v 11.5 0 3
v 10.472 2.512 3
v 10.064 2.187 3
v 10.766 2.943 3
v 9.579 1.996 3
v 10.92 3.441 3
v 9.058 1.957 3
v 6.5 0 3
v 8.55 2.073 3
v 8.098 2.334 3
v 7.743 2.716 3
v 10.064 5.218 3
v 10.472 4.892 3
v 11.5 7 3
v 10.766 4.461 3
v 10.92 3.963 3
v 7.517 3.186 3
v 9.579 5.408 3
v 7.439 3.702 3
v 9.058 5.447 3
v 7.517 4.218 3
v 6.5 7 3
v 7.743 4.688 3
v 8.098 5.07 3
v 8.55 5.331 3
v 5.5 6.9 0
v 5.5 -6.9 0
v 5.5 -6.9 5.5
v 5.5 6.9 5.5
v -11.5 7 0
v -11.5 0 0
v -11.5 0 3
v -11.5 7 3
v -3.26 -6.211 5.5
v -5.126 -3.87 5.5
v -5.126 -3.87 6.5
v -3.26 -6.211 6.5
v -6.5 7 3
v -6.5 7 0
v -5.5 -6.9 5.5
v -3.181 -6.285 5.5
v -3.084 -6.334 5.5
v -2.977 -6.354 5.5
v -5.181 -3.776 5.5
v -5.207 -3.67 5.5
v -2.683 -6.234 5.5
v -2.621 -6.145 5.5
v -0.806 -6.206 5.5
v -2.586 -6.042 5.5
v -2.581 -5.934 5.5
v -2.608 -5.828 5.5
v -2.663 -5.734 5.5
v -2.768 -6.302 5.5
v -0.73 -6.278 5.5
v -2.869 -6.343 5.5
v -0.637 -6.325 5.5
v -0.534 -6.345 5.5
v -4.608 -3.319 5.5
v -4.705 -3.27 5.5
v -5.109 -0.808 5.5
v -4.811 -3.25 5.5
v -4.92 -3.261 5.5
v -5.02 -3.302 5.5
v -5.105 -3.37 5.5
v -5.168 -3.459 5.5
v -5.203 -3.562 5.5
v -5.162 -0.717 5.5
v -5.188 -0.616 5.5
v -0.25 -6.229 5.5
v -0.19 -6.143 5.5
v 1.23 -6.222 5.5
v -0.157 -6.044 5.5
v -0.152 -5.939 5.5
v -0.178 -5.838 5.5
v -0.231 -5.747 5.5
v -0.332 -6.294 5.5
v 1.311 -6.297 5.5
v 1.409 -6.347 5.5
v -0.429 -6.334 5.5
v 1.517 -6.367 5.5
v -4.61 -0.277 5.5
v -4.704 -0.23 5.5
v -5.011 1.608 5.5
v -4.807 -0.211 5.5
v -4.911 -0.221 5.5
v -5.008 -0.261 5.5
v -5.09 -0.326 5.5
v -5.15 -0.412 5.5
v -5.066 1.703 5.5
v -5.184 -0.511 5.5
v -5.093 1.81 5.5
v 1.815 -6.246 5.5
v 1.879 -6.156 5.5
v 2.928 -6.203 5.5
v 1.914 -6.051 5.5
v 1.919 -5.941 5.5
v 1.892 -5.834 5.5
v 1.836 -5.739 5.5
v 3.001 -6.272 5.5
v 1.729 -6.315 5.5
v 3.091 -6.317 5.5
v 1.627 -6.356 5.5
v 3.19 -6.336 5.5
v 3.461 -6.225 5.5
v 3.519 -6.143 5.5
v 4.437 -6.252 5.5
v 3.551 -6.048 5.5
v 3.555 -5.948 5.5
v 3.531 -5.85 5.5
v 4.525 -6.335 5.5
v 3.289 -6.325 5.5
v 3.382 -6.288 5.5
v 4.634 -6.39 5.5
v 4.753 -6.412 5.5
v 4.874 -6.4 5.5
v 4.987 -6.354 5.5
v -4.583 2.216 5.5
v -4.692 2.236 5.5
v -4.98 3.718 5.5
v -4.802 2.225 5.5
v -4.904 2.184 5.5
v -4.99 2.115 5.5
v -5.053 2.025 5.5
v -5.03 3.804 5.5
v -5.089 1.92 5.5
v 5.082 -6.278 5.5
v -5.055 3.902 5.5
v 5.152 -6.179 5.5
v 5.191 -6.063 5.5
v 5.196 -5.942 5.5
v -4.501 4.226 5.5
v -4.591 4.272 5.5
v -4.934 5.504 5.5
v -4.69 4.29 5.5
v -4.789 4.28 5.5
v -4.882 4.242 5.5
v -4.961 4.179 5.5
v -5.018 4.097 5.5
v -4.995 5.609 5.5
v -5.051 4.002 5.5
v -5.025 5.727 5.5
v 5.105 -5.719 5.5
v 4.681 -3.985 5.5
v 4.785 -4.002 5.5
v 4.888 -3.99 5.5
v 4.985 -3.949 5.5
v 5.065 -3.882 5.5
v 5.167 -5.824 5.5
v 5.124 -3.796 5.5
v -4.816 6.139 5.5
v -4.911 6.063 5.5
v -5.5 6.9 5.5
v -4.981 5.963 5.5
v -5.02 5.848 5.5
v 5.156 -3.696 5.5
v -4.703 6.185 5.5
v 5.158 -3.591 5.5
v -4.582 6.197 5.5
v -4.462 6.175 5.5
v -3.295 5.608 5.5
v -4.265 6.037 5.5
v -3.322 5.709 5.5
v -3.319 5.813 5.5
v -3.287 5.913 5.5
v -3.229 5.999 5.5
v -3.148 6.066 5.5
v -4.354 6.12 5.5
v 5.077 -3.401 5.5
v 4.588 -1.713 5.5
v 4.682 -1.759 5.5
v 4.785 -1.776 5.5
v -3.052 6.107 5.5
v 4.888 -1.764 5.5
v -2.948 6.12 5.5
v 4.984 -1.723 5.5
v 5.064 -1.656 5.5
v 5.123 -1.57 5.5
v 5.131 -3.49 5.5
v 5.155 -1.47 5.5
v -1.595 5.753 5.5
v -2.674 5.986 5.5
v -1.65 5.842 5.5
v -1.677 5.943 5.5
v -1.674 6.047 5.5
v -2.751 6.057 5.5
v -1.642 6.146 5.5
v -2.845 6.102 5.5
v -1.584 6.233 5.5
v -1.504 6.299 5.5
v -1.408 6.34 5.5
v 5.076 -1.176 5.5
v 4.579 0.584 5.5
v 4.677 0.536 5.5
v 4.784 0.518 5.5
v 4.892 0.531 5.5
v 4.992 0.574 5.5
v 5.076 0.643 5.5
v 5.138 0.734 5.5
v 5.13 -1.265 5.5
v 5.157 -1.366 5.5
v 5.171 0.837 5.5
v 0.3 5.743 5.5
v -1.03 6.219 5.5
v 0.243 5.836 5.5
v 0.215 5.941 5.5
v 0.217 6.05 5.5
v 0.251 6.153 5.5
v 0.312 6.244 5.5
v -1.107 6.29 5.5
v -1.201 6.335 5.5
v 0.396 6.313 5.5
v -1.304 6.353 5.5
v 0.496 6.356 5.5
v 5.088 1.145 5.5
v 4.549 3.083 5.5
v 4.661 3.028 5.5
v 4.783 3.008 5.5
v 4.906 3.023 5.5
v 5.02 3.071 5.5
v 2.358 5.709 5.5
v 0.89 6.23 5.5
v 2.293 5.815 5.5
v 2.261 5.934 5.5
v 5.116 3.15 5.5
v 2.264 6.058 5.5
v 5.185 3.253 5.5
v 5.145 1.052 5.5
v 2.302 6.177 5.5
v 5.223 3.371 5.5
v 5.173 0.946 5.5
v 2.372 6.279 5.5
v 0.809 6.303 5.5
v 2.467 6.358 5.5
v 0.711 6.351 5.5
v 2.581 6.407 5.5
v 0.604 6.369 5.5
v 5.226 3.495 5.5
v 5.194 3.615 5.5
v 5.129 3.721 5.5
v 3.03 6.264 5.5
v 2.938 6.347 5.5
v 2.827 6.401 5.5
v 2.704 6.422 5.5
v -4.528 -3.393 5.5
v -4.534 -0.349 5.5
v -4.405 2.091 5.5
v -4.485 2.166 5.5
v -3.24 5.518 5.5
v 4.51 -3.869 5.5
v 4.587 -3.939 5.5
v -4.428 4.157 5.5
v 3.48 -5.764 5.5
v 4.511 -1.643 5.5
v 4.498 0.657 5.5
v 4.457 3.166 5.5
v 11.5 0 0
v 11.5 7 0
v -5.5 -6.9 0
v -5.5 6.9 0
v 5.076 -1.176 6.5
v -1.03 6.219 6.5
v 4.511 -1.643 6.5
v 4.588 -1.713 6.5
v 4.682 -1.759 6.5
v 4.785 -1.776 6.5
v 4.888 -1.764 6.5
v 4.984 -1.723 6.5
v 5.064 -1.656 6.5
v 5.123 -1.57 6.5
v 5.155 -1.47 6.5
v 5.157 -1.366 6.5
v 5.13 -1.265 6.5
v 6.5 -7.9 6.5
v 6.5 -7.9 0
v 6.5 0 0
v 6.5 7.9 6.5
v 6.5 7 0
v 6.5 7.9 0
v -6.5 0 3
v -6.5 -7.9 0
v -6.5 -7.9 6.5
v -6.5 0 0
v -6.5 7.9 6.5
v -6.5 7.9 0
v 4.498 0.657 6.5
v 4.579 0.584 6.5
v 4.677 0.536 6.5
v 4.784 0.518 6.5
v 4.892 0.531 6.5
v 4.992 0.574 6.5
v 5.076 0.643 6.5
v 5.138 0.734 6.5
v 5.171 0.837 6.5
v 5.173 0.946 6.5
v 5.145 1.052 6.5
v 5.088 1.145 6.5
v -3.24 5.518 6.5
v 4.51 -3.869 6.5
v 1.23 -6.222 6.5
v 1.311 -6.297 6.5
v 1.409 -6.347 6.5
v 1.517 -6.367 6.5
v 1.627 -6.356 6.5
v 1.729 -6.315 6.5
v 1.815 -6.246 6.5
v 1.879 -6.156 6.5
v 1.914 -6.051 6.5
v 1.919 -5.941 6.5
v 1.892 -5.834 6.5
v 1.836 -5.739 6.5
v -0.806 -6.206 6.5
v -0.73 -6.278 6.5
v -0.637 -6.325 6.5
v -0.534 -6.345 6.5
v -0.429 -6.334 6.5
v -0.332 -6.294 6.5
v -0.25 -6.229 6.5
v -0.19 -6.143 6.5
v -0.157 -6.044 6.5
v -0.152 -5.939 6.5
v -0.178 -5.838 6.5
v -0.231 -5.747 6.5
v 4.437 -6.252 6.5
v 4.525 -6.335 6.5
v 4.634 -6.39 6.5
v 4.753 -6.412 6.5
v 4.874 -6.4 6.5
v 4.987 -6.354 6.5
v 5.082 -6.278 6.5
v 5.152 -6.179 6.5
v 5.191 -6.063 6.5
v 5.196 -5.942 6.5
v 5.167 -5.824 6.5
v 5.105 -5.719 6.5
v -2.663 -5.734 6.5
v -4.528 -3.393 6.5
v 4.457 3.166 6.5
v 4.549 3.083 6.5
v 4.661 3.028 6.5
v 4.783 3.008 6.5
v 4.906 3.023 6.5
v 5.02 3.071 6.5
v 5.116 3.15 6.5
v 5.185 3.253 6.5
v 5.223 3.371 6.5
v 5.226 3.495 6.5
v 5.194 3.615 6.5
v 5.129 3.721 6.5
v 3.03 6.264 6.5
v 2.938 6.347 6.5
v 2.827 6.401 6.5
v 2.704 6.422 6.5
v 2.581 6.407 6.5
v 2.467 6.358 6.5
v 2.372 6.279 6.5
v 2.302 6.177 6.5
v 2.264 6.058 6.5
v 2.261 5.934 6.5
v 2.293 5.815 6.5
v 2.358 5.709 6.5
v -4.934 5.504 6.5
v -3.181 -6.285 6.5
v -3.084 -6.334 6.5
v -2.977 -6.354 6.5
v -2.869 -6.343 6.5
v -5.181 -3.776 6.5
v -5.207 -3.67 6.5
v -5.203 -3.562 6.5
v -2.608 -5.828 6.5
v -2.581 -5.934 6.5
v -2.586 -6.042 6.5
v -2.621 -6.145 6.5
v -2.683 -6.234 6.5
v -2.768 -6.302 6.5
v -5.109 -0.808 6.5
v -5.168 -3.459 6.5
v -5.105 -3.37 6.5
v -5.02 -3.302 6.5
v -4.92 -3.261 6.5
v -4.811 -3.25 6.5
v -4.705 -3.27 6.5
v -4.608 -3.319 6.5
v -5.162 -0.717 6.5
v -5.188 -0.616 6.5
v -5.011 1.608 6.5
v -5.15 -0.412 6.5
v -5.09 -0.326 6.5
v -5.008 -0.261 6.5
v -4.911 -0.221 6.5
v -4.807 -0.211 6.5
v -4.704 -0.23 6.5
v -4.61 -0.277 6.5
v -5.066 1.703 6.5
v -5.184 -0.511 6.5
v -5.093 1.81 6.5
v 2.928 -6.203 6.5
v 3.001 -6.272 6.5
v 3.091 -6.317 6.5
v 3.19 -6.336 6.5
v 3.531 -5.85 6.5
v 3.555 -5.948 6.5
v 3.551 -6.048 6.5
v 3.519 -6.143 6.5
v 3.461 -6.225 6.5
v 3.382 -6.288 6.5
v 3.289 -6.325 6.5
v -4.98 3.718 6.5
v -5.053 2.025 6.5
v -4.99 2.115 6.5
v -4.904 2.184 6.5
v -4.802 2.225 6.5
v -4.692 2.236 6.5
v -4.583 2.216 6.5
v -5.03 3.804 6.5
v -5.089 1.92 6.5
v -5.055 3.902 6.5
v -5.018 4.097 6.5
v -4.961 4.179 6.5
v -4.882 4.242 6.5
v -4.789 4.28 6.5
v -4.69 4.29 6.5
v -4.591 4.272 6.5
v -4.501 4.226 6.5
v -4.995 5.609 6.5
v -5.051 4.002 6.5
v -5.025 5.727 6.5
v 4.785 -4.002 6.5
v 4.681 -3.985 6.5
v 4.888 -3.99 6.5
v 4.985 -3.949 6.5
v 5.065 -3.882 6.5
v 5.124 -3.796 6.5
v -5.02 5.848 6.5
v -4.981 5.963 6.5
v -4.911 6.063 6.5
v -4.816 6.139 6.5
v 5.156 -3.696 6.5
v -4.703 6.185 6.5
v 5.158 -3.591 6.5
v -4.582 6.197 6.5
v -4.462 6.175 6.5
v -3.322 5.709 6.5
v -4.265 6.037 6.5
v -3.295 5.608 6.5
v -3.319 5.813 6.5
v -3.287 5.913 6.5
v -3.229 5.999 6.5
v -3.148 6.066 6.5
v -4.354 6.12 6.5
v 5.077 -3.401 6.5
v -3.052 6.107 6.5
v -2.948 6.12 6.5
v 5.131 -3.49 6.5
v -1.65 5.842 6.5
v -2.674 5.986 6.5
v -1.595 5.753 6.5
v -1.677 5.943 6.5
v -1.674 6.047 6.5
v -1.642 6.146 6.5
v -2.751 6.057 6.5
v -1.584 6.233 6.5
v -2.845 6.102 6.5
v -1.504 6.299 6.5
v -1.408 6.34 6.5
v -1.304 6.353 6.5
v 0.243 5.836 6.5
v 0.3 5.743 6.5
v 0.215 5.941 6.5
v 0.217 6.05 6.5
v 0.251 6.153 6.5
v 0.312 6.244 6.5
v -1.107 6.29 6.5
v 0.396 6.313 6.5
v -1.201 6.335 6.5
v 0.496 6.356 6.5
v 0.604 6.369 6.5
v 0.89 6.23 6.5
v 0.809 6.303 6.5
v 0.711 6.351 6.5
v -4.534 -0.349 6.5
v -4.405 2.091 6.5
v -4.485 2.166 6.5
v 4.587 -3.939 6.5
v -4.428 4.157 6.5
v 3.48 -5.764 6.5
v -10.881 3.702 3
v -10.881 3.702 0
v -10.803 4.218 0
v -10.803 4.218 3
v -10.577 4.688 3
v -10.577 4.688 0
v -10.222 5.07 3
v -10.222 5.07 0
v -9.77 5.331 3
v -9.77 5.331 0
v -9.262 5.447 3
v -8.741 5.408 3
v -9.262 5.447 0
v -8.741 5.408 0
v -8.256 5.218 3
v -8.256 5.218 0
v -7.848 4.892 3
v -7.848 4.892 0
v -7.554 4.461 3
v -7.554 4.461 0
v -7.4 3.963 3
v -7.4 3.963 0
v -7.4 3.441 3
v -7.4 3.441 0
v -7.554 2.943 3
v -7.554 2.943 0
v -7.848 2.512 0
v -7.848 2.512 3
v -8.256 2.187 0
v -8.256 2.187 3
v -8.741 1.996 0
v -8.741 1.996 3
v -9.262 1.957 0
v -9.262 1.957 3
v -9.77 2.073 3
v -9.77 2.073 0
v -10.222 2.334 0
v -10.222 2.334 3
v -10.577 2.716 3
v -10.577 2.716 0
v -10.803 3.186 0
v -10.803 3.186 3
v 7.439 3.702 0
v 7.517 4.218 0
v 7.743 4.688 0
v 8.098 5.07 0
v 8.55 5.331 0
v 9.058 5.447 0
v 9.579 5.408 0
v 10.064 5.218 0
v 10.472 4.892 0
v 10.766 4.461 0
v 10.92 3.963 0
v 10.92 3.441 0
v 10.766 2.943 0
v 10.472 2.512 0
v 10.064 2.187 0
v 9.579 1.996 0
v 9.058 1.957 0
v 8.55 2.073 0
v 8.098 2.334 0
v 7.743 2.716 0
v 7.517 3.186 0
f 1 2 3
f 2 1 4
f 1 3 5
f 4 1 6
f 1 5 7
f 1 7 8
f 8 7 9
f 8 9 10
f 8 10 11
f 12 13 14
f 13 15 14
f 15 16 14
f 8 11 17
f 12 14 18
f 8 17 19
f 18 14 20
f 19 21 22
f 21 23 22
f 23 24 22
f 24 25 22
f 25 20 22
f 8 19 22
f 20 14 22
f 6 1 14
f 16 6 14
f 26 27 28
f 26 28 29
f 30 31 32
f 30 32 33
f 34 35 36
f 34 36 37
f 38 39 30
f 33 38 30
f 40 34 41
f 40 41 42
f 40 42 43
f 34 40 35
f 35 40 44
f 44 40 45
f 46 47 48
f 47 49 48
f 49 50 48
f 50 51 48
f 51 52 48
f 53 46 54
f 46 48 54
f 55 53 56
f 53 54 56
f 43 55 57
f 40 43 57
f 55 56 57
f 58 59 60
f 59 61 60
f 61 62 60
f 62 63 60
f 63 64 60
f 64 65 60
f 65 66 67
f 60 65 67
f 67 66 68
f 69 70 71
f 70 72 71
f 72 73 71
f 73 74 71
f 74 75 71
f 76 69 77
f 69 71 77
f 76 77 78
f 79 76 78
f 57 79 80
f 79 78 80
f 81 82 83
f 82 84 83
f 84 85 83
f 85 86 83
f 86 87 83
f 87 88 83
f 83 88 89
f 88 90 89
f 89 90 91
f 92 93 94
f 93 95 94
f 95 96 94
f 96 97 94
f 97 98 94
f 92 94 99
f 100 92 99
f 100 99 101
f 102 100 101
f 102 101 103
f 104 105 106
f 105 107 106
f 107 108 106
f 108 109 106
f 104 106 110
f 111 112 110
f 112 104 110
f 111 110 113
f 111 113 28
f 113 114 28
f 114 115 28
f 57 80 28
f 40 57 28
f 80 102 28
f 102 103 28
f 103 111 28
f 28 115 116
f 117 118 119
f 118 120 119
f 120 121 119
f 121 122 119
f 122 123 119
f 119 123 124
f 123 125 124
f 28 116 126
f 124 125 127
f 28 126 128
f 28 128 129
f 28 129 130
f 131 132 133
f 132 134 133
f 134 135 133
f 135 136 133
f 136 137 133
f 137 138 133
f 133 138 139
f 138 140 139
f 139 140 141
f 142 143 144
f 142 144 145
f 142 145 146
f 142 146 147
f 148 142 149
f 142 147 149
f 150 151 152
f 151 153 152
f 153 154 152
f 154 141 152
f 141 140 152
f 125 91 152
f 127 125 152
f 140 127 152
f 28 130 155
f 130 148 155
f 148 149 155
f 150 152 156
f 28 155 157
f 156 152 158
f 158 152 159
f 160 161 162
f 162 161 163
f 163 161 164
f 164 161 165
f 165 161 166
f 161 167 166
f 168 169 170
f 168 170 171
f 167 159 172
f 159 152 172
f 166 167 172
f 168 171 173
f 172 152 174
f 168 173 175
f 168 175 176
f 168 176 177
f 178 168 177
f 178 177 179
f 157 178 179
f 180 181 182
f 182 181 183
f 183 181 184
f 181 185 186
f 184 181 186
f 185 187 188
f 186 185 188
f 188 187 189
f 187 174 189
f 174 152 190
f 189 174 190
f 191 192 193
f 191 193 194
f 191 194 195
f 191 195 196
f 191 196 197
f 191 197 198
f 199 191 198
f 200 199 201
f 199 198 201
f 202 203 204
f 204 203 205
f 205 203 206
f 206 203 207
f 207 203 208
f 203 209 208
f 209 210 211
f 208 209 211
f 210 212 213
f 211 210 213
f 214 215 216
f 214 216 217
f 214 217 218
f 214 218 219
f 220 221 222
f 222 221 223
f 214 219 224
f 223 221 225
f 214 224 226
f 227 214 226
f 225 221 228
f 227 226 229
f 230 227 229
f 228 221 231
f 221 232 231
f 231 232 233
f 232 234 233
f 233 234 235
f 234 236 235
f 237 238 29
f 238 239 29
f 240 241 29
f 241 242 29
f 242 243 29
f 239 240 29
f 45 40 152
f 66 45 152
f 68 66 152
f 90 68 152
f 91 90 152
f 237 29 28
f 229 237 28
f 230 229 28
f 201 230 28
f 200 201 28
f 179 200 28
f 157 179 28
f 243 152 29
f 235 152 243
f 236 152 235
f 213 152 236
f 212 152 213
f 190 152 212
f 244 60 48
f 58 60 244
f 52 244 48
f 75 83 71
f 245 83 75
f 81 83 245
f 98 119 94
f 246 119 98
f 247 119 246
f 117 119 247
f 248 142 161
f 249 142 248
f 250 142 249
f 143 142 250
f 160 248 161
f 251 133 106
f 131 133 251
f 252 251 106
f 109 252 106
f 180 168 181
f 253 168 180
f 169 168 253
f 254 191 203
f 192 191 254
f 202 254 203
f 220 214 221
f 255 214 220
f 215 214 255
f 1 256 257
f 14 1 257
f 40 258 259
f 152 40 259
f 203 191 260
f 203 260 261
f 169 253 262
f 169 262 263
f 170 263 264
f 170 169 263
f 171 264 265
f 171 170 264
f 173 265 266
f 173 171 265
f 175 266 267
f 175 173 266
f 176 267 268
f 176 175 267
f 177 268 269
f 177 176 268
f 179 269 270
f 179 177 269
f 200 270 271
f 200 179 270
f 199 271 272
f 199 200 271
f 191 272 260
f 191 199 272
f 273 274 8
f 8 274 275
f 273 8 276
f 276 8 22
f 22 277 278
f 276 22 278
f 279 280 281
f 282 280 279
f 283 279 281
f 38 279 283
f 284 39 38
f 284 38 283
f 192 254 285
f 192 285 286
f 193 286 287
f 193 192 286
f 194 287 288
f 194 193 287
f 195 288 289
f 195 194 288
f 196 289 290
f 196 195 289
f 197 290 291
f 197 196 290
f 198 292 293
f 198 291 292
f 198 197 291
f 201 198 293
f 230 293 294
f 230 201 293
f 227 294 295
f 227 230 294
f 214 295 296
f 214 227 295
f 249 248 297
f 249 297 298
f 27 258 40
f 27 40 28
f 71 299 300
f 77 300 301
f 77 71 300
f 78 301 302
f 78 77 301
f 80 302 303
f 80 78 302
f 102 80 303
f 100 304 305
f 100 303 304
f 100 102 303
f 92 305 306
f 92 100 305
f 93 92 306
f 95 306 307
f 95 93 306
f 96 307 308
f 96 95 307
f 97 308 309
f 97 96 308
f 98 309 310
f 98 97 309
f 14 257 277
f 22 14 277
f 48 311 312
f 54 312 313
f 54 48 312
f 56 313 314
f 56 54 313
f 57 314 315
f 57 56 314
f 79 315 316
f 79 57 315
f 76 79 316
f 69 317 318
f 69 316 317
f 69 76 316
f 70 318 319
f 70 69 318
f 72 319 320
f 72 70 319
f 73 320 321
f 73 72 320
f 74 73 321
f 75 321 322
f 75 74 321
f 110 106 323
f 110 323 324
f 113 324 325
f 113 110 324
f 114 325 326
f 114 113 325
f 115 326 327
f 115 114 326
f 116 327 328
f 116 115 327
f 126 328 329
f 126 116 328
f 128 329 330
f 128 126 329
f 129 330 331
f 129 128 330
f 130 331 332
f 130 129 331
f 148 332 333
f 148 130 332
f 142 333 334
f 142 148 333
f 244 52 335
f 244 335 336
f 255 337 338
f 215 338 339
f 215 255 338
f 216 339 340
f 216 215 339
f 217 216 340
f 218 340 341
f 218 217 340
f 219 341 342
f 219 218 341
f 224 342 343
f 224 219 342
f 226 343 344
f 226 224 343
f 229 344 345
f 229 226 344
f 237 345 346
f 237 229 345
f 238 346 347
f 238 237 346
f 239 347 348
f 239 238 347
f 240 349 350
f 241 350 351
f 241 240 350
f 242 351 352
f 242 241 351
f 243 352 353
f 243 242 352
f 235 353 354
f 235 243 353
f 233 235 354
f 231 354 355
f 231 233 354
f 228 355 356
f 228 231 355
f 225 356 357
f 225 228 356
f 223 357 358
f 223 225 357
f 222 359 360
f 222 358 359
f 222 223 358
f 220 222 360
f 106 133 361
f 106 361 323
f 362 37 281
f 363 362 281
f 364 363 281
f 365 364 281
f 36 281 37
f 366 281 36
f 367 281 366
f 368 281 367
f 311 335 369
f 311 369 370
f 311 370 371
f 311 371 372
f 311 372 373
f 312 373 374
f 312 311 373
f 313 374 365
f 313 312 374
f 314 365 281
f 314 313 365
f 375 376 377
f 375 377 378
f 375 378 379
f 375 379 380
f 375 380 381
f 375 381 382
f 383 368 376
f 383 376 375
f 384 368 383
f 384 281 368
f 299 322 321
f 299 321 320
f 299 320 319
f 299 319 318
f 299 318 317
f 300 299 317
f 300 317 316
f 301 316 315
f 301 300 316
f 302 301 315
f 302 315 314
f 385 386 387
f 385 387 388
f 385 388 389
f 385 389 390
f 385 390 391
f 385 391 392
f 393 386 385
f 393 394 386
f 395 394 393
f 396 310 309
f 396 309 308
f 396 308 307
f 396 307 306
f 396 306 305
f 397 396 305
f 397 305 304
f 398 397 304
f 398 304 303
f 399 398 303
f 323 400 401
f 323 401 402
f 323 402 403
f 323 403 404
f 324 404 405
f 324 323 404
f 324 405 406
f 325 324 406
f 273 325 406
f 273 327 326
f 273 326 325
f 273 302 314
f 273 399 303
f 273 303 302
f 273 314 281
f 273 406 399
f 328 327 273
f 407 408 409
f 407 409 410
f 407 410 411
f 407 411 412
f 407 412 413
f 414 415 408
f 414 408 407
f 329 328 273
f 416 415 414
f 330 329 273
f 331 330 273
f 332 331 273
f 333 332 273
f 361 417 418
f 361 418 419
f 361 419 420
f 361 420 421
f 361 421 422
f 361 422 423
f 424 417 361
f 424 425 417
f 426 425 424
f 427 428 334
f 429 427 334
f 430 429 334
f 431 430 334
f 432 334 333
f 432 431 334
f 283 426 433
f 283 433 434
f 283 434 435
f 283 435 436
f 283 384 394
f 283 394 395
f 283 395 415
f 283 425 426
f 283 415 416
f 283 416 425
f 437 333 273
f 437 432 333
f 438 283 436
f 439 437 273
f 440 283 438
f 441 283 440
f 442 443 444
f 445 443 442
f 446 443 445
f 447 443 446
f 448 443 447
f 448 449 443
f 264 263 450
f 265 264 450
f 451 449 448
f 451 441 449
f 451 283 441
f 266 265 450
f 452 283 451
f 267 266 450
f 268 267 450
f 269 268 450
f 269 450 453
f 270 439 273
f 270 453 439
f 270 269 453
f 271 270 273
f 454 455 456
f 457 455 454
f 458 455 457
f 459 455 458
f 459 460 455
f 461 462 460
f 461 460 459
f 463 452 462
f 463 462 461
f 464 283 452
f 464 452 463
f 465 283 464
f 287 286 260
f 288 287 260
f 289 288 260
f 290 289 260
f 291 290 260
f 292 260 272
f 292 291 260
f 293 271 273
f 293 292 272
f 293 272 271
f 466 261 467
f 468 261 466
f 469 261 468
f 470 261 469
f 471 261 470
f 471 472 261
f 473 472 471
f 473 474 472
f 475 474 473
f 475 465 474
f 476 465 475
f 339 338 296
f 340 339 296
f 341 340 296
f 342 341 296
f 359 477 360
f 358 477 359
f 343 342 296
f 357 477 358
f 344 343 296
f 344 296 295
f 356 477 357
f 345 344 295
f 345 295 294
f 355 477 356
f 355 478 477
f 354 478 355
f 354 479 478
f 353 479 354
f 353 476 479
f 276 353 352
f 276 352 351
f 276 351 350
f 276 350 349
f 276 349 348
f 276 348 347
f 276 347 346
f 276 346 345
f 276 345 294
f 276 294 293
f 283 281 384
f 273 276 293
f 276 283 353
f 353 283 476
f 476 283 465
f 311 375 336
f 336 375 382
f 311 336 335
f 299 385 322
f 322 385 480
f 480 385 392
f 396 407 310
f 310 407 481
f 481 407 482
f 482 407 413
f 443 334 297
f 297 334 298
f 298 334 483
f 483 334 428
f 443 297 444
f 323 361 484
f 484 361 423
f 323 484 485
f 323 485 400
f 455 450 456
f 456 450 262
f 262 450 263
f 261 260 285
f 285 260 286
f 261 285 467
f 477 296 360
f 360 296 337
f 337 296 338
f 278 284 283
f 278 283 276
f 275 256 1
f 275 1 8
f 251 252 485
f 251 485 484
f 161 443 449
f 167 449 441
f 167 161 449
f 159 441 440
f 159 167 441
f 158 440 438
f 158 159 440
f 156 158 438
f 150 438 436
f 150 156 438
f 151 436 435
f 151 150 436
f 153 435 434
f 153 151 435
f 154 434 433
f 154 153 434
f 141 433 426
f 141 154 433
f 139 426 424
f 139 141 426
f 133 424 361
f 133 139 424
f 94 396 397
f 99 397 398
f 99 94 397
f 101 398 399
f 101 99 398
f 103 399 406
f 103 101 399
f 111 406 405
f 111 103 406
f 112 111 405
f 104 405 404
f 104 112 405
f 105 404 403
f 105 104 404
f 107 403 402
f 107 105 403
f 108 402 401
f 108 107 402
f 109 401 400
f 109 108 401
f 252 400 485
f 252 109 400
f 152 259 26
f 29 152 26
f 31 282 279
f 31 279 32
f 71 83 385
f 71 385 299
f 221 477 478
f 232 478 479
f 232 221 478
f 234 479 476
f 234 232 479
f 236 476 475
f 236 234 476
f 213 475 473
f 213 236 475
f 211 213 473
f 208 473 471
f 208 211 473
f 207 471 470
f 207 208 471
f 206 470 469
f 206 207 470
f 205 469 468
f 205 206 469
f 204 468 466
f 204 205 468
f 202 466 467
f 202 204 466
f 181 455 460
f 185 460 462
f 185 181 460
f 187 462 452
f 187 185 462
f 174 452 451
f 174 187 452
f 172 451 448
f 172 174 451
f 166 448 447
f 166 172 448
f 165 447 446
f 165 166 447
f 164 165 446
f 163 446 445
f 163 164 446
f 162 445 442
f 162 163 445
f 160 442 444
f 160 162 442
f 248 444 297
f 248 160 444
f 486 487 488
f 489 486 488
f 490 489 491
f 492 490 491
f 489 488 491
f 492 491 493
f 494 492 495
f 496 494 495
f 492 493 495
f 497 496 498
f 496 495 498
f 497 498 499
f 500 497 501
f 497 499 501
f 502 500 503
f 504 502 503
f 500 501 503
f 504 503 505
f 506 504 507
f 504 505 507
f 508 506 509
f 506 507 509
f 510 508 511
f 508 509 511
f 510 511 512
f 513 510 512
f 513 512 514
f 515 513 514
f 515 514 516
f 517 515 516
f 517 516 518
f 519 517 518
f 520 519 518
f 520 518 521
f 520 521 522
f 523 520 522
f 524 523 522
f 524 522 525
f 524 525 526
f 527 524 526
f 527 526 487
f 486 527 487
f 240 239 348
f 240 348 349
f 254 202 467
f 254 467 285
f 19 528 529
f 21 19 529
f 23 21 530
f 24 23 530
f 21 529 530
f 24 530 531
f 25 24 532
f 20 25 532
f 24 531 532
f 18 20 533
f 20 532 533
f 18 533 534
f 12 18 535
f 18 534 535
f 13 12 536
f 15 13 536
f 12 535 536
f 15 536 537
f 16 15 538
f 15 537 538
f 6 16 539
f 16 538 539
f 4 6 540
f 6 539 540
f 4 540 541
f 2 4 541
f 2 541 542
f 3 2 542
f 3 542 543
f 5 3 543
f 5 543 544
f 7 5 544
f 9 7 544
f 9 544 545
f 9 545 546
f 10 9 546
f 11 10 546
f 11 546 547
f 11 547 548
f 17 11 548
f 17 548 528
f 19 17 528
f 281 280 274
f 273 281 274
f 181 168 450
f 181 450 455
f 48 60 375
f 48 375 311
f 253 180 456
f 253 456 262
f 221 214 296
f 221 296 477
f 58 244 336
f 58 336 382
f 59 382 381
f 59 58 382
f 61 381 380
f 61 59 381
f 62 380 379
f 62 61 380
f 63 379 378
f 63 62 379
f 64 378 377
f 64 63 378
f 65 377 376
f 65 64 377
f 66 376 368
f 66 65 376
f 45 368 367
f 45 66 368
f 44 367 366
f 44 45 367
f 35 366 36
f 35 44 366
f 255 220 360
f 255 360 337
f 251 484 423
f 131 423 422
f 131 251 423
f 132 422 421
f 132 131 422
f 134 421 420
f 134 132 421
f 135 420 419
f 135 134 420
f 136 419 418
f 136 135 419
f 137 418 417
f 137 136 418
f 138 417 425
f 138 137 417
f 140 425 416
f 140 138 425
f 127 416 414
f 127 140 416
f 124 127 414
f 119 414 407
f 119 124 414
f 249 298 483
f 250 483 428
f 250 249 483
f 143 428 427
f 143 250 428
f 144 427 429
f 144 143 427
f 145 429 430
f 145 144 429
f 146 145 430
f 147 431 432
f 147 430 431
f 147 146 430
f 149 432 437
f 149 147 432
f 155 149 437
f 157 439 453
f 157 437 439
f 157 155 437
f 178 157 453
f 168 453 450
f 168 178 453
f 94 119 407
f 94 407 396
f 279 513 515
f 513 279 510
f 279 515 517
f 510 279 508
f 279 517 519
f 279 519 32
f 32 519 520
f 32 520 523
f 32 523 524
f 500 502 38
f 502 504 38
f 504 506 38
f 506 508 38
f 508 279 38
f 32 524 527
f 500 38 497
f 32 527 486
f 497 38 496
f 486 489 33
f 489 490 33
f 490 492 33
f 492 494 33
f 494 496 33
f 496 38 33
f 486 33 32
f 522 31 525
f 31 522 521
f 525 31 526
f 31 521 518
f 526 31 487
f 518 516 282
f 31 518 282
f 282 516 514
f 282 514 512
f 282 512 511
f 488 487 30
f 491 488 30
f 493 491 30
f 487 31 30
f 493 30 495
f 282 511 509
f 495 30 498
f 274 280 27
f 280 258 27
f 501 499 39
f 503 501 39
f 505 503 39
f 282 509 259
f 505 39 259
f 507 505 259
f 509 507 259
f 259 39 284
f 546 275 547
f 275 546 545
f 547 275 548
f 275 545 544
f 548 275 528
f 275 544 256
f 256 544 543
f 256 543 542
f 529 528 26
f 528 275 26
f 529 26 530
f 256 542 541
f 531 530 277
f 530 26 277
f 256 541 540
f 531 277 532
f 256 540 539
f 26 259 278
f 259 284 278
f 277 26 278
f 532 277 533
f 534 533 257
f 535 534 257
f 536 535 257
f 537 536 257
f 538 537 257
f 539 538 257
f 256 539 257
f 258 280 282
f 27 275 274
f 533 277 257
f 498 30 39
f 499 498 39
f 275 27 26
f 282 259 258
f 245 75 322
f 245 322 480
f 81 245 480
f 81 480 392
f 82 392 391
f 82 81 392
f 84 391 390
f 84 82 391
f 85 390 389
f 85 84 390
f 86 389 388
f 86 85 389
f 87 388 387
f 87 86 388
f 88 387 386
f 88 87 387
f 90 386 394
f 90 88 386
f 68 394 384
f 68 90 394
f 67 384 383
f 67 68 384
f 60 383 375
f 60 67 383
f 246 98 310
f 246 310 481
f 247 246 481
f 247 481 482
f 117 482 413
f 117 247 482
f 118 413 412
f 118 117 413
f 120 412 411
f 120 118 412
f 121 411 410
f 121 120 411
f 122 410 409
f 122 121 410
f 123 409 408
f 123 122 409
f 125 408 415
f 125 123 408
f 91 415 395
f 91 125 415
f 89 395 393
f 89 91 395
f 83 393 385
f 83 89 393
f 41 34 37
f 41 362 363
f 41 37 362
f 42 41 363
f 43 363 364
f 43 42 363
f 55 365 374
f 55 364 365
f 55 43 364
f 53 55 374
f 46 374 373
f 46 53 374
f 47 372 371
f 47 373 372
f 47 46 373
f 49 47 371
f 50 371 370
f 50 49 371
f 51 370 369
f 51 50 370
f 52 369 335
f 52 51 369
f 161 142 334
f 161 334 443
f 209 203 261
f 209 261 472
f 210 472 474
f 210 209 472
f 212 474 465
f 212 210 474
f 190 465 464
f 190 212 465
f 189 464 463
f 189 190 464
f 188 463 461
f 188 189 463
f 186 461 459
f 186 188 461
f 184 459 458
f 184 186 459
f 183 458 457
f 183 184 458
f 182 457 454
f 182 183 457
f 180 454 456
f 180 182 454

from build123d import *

# Parameters (mm, degrees)
SKETCH1_W           = 13
SKETCH1_H           = 15.8
BOSS_EXTRUDE1_DEPTH = 6.5
SHELL1_T            = -1
CUT_EXTRUDE2_DEPTH  = 2.5
SKETCH3_W           = 5
SKETCH3_H           = 7
BOSS_EXTRUDE2_DEPTH = 3
SKETCH4_R           = 1.75
CUT_EXTRUDE3_DEPTH  = 5


with BuildPart() as part:
    # Sketch1 → Boss-Extrude1 (new body)
    with BuildSketch(Plane.XY):
        Rectangle(SKETCH1_W, SKETCH1_H)
    extrude(amount=BOSS_EXTRUDE1_DEPTH)

    # Shell1
    shell1_openings = [part.faces().sort_by_distance(p)[0] for p in [
        (0, 0, 0),
    ]]
    offset(amount=SHELL1_T, openings=shell1_openings, kind=Kind.INTERSECTION)

    # Sketch2 → Cut-Extrude2 (cut)
    with BuildSketch(Plane(origin=(0, 0, 5.5), x_dir=(-1, 0, 0), z_dir=(0, 0, -1))):
        with BuildLine():
            Line((-5.105072533, -5.71873747), (4.265069263, 6.036531329))
            ThreePointArc((4.265069263, 6.036531329), (4.865789922, 6.104354629), (4.933613222, 5.50363397))
            Line((4.933613222, 5.50363397), (-4.436528574, -6.251634828))
            ThreePointArc((-4.436528574, -6.251634828), (-5.037249233, -6.319458129), (-5.105072533, -5.71873747))
        make_face()
        with BuildLine():
            Line((-3.479803699, -5.763578957), (4.428264236, 4.157451726))
            ThreePointArc((4.428264236, 4.157451726), (4.923771659, 4.213396112), (4.979716045, 3.71788869))
            Line((4.979716045, 3.71788869), (-2.92835189, -6.203141993))
            ThreePointArc((-2.92835189, -6.203141993), (-3.423859312, -6.259086379), (-3.479803699, -5.763578957))
        make_face()
        with BuildLine():
            Line((-1.836206221, -5.738869047), (4.404824726, 2.090787959))
            ThreePointArc((4.404824726, 2.090787959), (4.949248544, 2.152255164), (5.01071575, 1.607831346))
            Line((5.01071575, 1.607831346), (-1.230315197, -6.22182566))
            ThreePointArc((-1.230315197, -6.22182566), (-1.774739016, -6.283292866), (-1.836206221, -5.738869047))
        make_face()
        with BuildLine():
            Line((0.230638955, -5.747393414), (4.533785605, -0.348900345))
            ThreePointArc((4.533785605, -0.348900345), (5.051093924, -0.290494567), (5.109499701, -0.807802886))
            Line((5.109499701, -0.807802886), (0.806353052, -6.206295955))
            ThreePointArc((0.806353052, -6.206295955), (0.289044733, -6.264701733), (0.230638955, -5.747393414))
        make_face()
        with BuildLine():
            Line((2.662525183, -5.734264805), (4.528368603, -3.393479423))
            ThreePointArc((4.528368603, -3.393479423), (5.065343895, -3.33285318), (5.125970138, -3.869828472))
            Line((5.125970138, -3.869828472), (3.260126717, -6.210613854))
            ThreePointArc((3.260126717, -6.210613854), (2.723151425, -6.271240097), (2.662525183, -5.734264805))
        make_face()
        with BuildLine():
            Line((-5.076600471, -3.401160753), (2.673836157, 5.986195062))
            ThreePointArc((2.673836157, 5.986195062), (3.1909607, 6.035588301), (3.24035394, 5.518463758))
            Line((3.24035394, 5.518463758), (-4.510082688, -3.868892057))
            ThreePointArc((-4.510082688, -3.868892057), (-5.027207231, -3.918285297), (-5.076600471, -3.401160753))
        make_face()
        with BuildLine():
            Line((-5.075895555, -1.176345618), (1.030282687, 6.219478717))
            ThreePointArc((1.030282687, 6.219478717), (1.546120318, 6.268749037), (1.595390638, 5.752911406))
            Line((1.595390638, 5.752911406), (-4.510787604, -1.642912929))
            ThreePointArc((-4.510787604, -1.642912929), (-5.026625235, -1.692183249), (-5.075895555, -1.176345618))
        make_face()
        with BuildLine():
            Line((-5.088414127, 1.144510192), (-0.889859337, 6.229814365))
            ThreePointArc((-0.889859337, 6.229814365), (-0.351167486, 6.281267609), (-0.299714242, 5.742575759))
            Line((-0.299714242, 5.742575759), (-4.498269031, 0.657271586))
            ThreePointArc((-4.498269031, 0.657271586), (-5.036960882, 0.605818341), (-5.088414127, 1.144510192))
        make_face()
        with BuildLine():
            Line((-5.129445403, 3.72103873), (-3.030168008, 6.263690816))
            ThreePointArc((-3.030168008, 6.263690816), (-2.416568429, 6.322298886), (-2.35796036, 5.708699307))
            Line((-2.35796036, 5.708699307), (-4.457237755, 3.166047221))
            ThreePointArc((-4.457237755, 3.166047221), (-5.070837334, 3.107439152), (-5.129445403, 3.72103873))
        make_face()
    extrude(amount=-CUT_EXTRUDE2_DEPTH, mode=Mode.SUBTRACT)

    # Sketch3 → Boss-Extrude2 (add)
    with BuildSketch(Plane(origin=(0, 0, 0), x_dir=(-1, 0, 0), z_dir=(0, 0, -1))):
        with Locations((9, 3.5)):
            Rectangle(SKETCH3_W, SKETCH3_H)
        with Locations((-9, 3.5)):
            Rectangle(SKETCH3_W, SKETCH3_H)
    extrude(amount=-BOSS_EXTRUDE2_DEPTH)

    # Sketch4 → Cut-Extrude3 (cut)
    with BuildSketch(Plane(origin=(0, 0, 0), x_dir=(-1, 0, 0), z_dir=(0, 0, -1))):
        with Locations((-9.18918569, 3.702089239)):
            Circle(SKETCH4_R)
        with Locations((9.130886442, 3.702089239)):
            Circle(SKETCH4_R)
    extrude(amount=-CUT_EXTRUDE3_DEPTH, mode=Mode.SUBTRACT)


solid = part.part
